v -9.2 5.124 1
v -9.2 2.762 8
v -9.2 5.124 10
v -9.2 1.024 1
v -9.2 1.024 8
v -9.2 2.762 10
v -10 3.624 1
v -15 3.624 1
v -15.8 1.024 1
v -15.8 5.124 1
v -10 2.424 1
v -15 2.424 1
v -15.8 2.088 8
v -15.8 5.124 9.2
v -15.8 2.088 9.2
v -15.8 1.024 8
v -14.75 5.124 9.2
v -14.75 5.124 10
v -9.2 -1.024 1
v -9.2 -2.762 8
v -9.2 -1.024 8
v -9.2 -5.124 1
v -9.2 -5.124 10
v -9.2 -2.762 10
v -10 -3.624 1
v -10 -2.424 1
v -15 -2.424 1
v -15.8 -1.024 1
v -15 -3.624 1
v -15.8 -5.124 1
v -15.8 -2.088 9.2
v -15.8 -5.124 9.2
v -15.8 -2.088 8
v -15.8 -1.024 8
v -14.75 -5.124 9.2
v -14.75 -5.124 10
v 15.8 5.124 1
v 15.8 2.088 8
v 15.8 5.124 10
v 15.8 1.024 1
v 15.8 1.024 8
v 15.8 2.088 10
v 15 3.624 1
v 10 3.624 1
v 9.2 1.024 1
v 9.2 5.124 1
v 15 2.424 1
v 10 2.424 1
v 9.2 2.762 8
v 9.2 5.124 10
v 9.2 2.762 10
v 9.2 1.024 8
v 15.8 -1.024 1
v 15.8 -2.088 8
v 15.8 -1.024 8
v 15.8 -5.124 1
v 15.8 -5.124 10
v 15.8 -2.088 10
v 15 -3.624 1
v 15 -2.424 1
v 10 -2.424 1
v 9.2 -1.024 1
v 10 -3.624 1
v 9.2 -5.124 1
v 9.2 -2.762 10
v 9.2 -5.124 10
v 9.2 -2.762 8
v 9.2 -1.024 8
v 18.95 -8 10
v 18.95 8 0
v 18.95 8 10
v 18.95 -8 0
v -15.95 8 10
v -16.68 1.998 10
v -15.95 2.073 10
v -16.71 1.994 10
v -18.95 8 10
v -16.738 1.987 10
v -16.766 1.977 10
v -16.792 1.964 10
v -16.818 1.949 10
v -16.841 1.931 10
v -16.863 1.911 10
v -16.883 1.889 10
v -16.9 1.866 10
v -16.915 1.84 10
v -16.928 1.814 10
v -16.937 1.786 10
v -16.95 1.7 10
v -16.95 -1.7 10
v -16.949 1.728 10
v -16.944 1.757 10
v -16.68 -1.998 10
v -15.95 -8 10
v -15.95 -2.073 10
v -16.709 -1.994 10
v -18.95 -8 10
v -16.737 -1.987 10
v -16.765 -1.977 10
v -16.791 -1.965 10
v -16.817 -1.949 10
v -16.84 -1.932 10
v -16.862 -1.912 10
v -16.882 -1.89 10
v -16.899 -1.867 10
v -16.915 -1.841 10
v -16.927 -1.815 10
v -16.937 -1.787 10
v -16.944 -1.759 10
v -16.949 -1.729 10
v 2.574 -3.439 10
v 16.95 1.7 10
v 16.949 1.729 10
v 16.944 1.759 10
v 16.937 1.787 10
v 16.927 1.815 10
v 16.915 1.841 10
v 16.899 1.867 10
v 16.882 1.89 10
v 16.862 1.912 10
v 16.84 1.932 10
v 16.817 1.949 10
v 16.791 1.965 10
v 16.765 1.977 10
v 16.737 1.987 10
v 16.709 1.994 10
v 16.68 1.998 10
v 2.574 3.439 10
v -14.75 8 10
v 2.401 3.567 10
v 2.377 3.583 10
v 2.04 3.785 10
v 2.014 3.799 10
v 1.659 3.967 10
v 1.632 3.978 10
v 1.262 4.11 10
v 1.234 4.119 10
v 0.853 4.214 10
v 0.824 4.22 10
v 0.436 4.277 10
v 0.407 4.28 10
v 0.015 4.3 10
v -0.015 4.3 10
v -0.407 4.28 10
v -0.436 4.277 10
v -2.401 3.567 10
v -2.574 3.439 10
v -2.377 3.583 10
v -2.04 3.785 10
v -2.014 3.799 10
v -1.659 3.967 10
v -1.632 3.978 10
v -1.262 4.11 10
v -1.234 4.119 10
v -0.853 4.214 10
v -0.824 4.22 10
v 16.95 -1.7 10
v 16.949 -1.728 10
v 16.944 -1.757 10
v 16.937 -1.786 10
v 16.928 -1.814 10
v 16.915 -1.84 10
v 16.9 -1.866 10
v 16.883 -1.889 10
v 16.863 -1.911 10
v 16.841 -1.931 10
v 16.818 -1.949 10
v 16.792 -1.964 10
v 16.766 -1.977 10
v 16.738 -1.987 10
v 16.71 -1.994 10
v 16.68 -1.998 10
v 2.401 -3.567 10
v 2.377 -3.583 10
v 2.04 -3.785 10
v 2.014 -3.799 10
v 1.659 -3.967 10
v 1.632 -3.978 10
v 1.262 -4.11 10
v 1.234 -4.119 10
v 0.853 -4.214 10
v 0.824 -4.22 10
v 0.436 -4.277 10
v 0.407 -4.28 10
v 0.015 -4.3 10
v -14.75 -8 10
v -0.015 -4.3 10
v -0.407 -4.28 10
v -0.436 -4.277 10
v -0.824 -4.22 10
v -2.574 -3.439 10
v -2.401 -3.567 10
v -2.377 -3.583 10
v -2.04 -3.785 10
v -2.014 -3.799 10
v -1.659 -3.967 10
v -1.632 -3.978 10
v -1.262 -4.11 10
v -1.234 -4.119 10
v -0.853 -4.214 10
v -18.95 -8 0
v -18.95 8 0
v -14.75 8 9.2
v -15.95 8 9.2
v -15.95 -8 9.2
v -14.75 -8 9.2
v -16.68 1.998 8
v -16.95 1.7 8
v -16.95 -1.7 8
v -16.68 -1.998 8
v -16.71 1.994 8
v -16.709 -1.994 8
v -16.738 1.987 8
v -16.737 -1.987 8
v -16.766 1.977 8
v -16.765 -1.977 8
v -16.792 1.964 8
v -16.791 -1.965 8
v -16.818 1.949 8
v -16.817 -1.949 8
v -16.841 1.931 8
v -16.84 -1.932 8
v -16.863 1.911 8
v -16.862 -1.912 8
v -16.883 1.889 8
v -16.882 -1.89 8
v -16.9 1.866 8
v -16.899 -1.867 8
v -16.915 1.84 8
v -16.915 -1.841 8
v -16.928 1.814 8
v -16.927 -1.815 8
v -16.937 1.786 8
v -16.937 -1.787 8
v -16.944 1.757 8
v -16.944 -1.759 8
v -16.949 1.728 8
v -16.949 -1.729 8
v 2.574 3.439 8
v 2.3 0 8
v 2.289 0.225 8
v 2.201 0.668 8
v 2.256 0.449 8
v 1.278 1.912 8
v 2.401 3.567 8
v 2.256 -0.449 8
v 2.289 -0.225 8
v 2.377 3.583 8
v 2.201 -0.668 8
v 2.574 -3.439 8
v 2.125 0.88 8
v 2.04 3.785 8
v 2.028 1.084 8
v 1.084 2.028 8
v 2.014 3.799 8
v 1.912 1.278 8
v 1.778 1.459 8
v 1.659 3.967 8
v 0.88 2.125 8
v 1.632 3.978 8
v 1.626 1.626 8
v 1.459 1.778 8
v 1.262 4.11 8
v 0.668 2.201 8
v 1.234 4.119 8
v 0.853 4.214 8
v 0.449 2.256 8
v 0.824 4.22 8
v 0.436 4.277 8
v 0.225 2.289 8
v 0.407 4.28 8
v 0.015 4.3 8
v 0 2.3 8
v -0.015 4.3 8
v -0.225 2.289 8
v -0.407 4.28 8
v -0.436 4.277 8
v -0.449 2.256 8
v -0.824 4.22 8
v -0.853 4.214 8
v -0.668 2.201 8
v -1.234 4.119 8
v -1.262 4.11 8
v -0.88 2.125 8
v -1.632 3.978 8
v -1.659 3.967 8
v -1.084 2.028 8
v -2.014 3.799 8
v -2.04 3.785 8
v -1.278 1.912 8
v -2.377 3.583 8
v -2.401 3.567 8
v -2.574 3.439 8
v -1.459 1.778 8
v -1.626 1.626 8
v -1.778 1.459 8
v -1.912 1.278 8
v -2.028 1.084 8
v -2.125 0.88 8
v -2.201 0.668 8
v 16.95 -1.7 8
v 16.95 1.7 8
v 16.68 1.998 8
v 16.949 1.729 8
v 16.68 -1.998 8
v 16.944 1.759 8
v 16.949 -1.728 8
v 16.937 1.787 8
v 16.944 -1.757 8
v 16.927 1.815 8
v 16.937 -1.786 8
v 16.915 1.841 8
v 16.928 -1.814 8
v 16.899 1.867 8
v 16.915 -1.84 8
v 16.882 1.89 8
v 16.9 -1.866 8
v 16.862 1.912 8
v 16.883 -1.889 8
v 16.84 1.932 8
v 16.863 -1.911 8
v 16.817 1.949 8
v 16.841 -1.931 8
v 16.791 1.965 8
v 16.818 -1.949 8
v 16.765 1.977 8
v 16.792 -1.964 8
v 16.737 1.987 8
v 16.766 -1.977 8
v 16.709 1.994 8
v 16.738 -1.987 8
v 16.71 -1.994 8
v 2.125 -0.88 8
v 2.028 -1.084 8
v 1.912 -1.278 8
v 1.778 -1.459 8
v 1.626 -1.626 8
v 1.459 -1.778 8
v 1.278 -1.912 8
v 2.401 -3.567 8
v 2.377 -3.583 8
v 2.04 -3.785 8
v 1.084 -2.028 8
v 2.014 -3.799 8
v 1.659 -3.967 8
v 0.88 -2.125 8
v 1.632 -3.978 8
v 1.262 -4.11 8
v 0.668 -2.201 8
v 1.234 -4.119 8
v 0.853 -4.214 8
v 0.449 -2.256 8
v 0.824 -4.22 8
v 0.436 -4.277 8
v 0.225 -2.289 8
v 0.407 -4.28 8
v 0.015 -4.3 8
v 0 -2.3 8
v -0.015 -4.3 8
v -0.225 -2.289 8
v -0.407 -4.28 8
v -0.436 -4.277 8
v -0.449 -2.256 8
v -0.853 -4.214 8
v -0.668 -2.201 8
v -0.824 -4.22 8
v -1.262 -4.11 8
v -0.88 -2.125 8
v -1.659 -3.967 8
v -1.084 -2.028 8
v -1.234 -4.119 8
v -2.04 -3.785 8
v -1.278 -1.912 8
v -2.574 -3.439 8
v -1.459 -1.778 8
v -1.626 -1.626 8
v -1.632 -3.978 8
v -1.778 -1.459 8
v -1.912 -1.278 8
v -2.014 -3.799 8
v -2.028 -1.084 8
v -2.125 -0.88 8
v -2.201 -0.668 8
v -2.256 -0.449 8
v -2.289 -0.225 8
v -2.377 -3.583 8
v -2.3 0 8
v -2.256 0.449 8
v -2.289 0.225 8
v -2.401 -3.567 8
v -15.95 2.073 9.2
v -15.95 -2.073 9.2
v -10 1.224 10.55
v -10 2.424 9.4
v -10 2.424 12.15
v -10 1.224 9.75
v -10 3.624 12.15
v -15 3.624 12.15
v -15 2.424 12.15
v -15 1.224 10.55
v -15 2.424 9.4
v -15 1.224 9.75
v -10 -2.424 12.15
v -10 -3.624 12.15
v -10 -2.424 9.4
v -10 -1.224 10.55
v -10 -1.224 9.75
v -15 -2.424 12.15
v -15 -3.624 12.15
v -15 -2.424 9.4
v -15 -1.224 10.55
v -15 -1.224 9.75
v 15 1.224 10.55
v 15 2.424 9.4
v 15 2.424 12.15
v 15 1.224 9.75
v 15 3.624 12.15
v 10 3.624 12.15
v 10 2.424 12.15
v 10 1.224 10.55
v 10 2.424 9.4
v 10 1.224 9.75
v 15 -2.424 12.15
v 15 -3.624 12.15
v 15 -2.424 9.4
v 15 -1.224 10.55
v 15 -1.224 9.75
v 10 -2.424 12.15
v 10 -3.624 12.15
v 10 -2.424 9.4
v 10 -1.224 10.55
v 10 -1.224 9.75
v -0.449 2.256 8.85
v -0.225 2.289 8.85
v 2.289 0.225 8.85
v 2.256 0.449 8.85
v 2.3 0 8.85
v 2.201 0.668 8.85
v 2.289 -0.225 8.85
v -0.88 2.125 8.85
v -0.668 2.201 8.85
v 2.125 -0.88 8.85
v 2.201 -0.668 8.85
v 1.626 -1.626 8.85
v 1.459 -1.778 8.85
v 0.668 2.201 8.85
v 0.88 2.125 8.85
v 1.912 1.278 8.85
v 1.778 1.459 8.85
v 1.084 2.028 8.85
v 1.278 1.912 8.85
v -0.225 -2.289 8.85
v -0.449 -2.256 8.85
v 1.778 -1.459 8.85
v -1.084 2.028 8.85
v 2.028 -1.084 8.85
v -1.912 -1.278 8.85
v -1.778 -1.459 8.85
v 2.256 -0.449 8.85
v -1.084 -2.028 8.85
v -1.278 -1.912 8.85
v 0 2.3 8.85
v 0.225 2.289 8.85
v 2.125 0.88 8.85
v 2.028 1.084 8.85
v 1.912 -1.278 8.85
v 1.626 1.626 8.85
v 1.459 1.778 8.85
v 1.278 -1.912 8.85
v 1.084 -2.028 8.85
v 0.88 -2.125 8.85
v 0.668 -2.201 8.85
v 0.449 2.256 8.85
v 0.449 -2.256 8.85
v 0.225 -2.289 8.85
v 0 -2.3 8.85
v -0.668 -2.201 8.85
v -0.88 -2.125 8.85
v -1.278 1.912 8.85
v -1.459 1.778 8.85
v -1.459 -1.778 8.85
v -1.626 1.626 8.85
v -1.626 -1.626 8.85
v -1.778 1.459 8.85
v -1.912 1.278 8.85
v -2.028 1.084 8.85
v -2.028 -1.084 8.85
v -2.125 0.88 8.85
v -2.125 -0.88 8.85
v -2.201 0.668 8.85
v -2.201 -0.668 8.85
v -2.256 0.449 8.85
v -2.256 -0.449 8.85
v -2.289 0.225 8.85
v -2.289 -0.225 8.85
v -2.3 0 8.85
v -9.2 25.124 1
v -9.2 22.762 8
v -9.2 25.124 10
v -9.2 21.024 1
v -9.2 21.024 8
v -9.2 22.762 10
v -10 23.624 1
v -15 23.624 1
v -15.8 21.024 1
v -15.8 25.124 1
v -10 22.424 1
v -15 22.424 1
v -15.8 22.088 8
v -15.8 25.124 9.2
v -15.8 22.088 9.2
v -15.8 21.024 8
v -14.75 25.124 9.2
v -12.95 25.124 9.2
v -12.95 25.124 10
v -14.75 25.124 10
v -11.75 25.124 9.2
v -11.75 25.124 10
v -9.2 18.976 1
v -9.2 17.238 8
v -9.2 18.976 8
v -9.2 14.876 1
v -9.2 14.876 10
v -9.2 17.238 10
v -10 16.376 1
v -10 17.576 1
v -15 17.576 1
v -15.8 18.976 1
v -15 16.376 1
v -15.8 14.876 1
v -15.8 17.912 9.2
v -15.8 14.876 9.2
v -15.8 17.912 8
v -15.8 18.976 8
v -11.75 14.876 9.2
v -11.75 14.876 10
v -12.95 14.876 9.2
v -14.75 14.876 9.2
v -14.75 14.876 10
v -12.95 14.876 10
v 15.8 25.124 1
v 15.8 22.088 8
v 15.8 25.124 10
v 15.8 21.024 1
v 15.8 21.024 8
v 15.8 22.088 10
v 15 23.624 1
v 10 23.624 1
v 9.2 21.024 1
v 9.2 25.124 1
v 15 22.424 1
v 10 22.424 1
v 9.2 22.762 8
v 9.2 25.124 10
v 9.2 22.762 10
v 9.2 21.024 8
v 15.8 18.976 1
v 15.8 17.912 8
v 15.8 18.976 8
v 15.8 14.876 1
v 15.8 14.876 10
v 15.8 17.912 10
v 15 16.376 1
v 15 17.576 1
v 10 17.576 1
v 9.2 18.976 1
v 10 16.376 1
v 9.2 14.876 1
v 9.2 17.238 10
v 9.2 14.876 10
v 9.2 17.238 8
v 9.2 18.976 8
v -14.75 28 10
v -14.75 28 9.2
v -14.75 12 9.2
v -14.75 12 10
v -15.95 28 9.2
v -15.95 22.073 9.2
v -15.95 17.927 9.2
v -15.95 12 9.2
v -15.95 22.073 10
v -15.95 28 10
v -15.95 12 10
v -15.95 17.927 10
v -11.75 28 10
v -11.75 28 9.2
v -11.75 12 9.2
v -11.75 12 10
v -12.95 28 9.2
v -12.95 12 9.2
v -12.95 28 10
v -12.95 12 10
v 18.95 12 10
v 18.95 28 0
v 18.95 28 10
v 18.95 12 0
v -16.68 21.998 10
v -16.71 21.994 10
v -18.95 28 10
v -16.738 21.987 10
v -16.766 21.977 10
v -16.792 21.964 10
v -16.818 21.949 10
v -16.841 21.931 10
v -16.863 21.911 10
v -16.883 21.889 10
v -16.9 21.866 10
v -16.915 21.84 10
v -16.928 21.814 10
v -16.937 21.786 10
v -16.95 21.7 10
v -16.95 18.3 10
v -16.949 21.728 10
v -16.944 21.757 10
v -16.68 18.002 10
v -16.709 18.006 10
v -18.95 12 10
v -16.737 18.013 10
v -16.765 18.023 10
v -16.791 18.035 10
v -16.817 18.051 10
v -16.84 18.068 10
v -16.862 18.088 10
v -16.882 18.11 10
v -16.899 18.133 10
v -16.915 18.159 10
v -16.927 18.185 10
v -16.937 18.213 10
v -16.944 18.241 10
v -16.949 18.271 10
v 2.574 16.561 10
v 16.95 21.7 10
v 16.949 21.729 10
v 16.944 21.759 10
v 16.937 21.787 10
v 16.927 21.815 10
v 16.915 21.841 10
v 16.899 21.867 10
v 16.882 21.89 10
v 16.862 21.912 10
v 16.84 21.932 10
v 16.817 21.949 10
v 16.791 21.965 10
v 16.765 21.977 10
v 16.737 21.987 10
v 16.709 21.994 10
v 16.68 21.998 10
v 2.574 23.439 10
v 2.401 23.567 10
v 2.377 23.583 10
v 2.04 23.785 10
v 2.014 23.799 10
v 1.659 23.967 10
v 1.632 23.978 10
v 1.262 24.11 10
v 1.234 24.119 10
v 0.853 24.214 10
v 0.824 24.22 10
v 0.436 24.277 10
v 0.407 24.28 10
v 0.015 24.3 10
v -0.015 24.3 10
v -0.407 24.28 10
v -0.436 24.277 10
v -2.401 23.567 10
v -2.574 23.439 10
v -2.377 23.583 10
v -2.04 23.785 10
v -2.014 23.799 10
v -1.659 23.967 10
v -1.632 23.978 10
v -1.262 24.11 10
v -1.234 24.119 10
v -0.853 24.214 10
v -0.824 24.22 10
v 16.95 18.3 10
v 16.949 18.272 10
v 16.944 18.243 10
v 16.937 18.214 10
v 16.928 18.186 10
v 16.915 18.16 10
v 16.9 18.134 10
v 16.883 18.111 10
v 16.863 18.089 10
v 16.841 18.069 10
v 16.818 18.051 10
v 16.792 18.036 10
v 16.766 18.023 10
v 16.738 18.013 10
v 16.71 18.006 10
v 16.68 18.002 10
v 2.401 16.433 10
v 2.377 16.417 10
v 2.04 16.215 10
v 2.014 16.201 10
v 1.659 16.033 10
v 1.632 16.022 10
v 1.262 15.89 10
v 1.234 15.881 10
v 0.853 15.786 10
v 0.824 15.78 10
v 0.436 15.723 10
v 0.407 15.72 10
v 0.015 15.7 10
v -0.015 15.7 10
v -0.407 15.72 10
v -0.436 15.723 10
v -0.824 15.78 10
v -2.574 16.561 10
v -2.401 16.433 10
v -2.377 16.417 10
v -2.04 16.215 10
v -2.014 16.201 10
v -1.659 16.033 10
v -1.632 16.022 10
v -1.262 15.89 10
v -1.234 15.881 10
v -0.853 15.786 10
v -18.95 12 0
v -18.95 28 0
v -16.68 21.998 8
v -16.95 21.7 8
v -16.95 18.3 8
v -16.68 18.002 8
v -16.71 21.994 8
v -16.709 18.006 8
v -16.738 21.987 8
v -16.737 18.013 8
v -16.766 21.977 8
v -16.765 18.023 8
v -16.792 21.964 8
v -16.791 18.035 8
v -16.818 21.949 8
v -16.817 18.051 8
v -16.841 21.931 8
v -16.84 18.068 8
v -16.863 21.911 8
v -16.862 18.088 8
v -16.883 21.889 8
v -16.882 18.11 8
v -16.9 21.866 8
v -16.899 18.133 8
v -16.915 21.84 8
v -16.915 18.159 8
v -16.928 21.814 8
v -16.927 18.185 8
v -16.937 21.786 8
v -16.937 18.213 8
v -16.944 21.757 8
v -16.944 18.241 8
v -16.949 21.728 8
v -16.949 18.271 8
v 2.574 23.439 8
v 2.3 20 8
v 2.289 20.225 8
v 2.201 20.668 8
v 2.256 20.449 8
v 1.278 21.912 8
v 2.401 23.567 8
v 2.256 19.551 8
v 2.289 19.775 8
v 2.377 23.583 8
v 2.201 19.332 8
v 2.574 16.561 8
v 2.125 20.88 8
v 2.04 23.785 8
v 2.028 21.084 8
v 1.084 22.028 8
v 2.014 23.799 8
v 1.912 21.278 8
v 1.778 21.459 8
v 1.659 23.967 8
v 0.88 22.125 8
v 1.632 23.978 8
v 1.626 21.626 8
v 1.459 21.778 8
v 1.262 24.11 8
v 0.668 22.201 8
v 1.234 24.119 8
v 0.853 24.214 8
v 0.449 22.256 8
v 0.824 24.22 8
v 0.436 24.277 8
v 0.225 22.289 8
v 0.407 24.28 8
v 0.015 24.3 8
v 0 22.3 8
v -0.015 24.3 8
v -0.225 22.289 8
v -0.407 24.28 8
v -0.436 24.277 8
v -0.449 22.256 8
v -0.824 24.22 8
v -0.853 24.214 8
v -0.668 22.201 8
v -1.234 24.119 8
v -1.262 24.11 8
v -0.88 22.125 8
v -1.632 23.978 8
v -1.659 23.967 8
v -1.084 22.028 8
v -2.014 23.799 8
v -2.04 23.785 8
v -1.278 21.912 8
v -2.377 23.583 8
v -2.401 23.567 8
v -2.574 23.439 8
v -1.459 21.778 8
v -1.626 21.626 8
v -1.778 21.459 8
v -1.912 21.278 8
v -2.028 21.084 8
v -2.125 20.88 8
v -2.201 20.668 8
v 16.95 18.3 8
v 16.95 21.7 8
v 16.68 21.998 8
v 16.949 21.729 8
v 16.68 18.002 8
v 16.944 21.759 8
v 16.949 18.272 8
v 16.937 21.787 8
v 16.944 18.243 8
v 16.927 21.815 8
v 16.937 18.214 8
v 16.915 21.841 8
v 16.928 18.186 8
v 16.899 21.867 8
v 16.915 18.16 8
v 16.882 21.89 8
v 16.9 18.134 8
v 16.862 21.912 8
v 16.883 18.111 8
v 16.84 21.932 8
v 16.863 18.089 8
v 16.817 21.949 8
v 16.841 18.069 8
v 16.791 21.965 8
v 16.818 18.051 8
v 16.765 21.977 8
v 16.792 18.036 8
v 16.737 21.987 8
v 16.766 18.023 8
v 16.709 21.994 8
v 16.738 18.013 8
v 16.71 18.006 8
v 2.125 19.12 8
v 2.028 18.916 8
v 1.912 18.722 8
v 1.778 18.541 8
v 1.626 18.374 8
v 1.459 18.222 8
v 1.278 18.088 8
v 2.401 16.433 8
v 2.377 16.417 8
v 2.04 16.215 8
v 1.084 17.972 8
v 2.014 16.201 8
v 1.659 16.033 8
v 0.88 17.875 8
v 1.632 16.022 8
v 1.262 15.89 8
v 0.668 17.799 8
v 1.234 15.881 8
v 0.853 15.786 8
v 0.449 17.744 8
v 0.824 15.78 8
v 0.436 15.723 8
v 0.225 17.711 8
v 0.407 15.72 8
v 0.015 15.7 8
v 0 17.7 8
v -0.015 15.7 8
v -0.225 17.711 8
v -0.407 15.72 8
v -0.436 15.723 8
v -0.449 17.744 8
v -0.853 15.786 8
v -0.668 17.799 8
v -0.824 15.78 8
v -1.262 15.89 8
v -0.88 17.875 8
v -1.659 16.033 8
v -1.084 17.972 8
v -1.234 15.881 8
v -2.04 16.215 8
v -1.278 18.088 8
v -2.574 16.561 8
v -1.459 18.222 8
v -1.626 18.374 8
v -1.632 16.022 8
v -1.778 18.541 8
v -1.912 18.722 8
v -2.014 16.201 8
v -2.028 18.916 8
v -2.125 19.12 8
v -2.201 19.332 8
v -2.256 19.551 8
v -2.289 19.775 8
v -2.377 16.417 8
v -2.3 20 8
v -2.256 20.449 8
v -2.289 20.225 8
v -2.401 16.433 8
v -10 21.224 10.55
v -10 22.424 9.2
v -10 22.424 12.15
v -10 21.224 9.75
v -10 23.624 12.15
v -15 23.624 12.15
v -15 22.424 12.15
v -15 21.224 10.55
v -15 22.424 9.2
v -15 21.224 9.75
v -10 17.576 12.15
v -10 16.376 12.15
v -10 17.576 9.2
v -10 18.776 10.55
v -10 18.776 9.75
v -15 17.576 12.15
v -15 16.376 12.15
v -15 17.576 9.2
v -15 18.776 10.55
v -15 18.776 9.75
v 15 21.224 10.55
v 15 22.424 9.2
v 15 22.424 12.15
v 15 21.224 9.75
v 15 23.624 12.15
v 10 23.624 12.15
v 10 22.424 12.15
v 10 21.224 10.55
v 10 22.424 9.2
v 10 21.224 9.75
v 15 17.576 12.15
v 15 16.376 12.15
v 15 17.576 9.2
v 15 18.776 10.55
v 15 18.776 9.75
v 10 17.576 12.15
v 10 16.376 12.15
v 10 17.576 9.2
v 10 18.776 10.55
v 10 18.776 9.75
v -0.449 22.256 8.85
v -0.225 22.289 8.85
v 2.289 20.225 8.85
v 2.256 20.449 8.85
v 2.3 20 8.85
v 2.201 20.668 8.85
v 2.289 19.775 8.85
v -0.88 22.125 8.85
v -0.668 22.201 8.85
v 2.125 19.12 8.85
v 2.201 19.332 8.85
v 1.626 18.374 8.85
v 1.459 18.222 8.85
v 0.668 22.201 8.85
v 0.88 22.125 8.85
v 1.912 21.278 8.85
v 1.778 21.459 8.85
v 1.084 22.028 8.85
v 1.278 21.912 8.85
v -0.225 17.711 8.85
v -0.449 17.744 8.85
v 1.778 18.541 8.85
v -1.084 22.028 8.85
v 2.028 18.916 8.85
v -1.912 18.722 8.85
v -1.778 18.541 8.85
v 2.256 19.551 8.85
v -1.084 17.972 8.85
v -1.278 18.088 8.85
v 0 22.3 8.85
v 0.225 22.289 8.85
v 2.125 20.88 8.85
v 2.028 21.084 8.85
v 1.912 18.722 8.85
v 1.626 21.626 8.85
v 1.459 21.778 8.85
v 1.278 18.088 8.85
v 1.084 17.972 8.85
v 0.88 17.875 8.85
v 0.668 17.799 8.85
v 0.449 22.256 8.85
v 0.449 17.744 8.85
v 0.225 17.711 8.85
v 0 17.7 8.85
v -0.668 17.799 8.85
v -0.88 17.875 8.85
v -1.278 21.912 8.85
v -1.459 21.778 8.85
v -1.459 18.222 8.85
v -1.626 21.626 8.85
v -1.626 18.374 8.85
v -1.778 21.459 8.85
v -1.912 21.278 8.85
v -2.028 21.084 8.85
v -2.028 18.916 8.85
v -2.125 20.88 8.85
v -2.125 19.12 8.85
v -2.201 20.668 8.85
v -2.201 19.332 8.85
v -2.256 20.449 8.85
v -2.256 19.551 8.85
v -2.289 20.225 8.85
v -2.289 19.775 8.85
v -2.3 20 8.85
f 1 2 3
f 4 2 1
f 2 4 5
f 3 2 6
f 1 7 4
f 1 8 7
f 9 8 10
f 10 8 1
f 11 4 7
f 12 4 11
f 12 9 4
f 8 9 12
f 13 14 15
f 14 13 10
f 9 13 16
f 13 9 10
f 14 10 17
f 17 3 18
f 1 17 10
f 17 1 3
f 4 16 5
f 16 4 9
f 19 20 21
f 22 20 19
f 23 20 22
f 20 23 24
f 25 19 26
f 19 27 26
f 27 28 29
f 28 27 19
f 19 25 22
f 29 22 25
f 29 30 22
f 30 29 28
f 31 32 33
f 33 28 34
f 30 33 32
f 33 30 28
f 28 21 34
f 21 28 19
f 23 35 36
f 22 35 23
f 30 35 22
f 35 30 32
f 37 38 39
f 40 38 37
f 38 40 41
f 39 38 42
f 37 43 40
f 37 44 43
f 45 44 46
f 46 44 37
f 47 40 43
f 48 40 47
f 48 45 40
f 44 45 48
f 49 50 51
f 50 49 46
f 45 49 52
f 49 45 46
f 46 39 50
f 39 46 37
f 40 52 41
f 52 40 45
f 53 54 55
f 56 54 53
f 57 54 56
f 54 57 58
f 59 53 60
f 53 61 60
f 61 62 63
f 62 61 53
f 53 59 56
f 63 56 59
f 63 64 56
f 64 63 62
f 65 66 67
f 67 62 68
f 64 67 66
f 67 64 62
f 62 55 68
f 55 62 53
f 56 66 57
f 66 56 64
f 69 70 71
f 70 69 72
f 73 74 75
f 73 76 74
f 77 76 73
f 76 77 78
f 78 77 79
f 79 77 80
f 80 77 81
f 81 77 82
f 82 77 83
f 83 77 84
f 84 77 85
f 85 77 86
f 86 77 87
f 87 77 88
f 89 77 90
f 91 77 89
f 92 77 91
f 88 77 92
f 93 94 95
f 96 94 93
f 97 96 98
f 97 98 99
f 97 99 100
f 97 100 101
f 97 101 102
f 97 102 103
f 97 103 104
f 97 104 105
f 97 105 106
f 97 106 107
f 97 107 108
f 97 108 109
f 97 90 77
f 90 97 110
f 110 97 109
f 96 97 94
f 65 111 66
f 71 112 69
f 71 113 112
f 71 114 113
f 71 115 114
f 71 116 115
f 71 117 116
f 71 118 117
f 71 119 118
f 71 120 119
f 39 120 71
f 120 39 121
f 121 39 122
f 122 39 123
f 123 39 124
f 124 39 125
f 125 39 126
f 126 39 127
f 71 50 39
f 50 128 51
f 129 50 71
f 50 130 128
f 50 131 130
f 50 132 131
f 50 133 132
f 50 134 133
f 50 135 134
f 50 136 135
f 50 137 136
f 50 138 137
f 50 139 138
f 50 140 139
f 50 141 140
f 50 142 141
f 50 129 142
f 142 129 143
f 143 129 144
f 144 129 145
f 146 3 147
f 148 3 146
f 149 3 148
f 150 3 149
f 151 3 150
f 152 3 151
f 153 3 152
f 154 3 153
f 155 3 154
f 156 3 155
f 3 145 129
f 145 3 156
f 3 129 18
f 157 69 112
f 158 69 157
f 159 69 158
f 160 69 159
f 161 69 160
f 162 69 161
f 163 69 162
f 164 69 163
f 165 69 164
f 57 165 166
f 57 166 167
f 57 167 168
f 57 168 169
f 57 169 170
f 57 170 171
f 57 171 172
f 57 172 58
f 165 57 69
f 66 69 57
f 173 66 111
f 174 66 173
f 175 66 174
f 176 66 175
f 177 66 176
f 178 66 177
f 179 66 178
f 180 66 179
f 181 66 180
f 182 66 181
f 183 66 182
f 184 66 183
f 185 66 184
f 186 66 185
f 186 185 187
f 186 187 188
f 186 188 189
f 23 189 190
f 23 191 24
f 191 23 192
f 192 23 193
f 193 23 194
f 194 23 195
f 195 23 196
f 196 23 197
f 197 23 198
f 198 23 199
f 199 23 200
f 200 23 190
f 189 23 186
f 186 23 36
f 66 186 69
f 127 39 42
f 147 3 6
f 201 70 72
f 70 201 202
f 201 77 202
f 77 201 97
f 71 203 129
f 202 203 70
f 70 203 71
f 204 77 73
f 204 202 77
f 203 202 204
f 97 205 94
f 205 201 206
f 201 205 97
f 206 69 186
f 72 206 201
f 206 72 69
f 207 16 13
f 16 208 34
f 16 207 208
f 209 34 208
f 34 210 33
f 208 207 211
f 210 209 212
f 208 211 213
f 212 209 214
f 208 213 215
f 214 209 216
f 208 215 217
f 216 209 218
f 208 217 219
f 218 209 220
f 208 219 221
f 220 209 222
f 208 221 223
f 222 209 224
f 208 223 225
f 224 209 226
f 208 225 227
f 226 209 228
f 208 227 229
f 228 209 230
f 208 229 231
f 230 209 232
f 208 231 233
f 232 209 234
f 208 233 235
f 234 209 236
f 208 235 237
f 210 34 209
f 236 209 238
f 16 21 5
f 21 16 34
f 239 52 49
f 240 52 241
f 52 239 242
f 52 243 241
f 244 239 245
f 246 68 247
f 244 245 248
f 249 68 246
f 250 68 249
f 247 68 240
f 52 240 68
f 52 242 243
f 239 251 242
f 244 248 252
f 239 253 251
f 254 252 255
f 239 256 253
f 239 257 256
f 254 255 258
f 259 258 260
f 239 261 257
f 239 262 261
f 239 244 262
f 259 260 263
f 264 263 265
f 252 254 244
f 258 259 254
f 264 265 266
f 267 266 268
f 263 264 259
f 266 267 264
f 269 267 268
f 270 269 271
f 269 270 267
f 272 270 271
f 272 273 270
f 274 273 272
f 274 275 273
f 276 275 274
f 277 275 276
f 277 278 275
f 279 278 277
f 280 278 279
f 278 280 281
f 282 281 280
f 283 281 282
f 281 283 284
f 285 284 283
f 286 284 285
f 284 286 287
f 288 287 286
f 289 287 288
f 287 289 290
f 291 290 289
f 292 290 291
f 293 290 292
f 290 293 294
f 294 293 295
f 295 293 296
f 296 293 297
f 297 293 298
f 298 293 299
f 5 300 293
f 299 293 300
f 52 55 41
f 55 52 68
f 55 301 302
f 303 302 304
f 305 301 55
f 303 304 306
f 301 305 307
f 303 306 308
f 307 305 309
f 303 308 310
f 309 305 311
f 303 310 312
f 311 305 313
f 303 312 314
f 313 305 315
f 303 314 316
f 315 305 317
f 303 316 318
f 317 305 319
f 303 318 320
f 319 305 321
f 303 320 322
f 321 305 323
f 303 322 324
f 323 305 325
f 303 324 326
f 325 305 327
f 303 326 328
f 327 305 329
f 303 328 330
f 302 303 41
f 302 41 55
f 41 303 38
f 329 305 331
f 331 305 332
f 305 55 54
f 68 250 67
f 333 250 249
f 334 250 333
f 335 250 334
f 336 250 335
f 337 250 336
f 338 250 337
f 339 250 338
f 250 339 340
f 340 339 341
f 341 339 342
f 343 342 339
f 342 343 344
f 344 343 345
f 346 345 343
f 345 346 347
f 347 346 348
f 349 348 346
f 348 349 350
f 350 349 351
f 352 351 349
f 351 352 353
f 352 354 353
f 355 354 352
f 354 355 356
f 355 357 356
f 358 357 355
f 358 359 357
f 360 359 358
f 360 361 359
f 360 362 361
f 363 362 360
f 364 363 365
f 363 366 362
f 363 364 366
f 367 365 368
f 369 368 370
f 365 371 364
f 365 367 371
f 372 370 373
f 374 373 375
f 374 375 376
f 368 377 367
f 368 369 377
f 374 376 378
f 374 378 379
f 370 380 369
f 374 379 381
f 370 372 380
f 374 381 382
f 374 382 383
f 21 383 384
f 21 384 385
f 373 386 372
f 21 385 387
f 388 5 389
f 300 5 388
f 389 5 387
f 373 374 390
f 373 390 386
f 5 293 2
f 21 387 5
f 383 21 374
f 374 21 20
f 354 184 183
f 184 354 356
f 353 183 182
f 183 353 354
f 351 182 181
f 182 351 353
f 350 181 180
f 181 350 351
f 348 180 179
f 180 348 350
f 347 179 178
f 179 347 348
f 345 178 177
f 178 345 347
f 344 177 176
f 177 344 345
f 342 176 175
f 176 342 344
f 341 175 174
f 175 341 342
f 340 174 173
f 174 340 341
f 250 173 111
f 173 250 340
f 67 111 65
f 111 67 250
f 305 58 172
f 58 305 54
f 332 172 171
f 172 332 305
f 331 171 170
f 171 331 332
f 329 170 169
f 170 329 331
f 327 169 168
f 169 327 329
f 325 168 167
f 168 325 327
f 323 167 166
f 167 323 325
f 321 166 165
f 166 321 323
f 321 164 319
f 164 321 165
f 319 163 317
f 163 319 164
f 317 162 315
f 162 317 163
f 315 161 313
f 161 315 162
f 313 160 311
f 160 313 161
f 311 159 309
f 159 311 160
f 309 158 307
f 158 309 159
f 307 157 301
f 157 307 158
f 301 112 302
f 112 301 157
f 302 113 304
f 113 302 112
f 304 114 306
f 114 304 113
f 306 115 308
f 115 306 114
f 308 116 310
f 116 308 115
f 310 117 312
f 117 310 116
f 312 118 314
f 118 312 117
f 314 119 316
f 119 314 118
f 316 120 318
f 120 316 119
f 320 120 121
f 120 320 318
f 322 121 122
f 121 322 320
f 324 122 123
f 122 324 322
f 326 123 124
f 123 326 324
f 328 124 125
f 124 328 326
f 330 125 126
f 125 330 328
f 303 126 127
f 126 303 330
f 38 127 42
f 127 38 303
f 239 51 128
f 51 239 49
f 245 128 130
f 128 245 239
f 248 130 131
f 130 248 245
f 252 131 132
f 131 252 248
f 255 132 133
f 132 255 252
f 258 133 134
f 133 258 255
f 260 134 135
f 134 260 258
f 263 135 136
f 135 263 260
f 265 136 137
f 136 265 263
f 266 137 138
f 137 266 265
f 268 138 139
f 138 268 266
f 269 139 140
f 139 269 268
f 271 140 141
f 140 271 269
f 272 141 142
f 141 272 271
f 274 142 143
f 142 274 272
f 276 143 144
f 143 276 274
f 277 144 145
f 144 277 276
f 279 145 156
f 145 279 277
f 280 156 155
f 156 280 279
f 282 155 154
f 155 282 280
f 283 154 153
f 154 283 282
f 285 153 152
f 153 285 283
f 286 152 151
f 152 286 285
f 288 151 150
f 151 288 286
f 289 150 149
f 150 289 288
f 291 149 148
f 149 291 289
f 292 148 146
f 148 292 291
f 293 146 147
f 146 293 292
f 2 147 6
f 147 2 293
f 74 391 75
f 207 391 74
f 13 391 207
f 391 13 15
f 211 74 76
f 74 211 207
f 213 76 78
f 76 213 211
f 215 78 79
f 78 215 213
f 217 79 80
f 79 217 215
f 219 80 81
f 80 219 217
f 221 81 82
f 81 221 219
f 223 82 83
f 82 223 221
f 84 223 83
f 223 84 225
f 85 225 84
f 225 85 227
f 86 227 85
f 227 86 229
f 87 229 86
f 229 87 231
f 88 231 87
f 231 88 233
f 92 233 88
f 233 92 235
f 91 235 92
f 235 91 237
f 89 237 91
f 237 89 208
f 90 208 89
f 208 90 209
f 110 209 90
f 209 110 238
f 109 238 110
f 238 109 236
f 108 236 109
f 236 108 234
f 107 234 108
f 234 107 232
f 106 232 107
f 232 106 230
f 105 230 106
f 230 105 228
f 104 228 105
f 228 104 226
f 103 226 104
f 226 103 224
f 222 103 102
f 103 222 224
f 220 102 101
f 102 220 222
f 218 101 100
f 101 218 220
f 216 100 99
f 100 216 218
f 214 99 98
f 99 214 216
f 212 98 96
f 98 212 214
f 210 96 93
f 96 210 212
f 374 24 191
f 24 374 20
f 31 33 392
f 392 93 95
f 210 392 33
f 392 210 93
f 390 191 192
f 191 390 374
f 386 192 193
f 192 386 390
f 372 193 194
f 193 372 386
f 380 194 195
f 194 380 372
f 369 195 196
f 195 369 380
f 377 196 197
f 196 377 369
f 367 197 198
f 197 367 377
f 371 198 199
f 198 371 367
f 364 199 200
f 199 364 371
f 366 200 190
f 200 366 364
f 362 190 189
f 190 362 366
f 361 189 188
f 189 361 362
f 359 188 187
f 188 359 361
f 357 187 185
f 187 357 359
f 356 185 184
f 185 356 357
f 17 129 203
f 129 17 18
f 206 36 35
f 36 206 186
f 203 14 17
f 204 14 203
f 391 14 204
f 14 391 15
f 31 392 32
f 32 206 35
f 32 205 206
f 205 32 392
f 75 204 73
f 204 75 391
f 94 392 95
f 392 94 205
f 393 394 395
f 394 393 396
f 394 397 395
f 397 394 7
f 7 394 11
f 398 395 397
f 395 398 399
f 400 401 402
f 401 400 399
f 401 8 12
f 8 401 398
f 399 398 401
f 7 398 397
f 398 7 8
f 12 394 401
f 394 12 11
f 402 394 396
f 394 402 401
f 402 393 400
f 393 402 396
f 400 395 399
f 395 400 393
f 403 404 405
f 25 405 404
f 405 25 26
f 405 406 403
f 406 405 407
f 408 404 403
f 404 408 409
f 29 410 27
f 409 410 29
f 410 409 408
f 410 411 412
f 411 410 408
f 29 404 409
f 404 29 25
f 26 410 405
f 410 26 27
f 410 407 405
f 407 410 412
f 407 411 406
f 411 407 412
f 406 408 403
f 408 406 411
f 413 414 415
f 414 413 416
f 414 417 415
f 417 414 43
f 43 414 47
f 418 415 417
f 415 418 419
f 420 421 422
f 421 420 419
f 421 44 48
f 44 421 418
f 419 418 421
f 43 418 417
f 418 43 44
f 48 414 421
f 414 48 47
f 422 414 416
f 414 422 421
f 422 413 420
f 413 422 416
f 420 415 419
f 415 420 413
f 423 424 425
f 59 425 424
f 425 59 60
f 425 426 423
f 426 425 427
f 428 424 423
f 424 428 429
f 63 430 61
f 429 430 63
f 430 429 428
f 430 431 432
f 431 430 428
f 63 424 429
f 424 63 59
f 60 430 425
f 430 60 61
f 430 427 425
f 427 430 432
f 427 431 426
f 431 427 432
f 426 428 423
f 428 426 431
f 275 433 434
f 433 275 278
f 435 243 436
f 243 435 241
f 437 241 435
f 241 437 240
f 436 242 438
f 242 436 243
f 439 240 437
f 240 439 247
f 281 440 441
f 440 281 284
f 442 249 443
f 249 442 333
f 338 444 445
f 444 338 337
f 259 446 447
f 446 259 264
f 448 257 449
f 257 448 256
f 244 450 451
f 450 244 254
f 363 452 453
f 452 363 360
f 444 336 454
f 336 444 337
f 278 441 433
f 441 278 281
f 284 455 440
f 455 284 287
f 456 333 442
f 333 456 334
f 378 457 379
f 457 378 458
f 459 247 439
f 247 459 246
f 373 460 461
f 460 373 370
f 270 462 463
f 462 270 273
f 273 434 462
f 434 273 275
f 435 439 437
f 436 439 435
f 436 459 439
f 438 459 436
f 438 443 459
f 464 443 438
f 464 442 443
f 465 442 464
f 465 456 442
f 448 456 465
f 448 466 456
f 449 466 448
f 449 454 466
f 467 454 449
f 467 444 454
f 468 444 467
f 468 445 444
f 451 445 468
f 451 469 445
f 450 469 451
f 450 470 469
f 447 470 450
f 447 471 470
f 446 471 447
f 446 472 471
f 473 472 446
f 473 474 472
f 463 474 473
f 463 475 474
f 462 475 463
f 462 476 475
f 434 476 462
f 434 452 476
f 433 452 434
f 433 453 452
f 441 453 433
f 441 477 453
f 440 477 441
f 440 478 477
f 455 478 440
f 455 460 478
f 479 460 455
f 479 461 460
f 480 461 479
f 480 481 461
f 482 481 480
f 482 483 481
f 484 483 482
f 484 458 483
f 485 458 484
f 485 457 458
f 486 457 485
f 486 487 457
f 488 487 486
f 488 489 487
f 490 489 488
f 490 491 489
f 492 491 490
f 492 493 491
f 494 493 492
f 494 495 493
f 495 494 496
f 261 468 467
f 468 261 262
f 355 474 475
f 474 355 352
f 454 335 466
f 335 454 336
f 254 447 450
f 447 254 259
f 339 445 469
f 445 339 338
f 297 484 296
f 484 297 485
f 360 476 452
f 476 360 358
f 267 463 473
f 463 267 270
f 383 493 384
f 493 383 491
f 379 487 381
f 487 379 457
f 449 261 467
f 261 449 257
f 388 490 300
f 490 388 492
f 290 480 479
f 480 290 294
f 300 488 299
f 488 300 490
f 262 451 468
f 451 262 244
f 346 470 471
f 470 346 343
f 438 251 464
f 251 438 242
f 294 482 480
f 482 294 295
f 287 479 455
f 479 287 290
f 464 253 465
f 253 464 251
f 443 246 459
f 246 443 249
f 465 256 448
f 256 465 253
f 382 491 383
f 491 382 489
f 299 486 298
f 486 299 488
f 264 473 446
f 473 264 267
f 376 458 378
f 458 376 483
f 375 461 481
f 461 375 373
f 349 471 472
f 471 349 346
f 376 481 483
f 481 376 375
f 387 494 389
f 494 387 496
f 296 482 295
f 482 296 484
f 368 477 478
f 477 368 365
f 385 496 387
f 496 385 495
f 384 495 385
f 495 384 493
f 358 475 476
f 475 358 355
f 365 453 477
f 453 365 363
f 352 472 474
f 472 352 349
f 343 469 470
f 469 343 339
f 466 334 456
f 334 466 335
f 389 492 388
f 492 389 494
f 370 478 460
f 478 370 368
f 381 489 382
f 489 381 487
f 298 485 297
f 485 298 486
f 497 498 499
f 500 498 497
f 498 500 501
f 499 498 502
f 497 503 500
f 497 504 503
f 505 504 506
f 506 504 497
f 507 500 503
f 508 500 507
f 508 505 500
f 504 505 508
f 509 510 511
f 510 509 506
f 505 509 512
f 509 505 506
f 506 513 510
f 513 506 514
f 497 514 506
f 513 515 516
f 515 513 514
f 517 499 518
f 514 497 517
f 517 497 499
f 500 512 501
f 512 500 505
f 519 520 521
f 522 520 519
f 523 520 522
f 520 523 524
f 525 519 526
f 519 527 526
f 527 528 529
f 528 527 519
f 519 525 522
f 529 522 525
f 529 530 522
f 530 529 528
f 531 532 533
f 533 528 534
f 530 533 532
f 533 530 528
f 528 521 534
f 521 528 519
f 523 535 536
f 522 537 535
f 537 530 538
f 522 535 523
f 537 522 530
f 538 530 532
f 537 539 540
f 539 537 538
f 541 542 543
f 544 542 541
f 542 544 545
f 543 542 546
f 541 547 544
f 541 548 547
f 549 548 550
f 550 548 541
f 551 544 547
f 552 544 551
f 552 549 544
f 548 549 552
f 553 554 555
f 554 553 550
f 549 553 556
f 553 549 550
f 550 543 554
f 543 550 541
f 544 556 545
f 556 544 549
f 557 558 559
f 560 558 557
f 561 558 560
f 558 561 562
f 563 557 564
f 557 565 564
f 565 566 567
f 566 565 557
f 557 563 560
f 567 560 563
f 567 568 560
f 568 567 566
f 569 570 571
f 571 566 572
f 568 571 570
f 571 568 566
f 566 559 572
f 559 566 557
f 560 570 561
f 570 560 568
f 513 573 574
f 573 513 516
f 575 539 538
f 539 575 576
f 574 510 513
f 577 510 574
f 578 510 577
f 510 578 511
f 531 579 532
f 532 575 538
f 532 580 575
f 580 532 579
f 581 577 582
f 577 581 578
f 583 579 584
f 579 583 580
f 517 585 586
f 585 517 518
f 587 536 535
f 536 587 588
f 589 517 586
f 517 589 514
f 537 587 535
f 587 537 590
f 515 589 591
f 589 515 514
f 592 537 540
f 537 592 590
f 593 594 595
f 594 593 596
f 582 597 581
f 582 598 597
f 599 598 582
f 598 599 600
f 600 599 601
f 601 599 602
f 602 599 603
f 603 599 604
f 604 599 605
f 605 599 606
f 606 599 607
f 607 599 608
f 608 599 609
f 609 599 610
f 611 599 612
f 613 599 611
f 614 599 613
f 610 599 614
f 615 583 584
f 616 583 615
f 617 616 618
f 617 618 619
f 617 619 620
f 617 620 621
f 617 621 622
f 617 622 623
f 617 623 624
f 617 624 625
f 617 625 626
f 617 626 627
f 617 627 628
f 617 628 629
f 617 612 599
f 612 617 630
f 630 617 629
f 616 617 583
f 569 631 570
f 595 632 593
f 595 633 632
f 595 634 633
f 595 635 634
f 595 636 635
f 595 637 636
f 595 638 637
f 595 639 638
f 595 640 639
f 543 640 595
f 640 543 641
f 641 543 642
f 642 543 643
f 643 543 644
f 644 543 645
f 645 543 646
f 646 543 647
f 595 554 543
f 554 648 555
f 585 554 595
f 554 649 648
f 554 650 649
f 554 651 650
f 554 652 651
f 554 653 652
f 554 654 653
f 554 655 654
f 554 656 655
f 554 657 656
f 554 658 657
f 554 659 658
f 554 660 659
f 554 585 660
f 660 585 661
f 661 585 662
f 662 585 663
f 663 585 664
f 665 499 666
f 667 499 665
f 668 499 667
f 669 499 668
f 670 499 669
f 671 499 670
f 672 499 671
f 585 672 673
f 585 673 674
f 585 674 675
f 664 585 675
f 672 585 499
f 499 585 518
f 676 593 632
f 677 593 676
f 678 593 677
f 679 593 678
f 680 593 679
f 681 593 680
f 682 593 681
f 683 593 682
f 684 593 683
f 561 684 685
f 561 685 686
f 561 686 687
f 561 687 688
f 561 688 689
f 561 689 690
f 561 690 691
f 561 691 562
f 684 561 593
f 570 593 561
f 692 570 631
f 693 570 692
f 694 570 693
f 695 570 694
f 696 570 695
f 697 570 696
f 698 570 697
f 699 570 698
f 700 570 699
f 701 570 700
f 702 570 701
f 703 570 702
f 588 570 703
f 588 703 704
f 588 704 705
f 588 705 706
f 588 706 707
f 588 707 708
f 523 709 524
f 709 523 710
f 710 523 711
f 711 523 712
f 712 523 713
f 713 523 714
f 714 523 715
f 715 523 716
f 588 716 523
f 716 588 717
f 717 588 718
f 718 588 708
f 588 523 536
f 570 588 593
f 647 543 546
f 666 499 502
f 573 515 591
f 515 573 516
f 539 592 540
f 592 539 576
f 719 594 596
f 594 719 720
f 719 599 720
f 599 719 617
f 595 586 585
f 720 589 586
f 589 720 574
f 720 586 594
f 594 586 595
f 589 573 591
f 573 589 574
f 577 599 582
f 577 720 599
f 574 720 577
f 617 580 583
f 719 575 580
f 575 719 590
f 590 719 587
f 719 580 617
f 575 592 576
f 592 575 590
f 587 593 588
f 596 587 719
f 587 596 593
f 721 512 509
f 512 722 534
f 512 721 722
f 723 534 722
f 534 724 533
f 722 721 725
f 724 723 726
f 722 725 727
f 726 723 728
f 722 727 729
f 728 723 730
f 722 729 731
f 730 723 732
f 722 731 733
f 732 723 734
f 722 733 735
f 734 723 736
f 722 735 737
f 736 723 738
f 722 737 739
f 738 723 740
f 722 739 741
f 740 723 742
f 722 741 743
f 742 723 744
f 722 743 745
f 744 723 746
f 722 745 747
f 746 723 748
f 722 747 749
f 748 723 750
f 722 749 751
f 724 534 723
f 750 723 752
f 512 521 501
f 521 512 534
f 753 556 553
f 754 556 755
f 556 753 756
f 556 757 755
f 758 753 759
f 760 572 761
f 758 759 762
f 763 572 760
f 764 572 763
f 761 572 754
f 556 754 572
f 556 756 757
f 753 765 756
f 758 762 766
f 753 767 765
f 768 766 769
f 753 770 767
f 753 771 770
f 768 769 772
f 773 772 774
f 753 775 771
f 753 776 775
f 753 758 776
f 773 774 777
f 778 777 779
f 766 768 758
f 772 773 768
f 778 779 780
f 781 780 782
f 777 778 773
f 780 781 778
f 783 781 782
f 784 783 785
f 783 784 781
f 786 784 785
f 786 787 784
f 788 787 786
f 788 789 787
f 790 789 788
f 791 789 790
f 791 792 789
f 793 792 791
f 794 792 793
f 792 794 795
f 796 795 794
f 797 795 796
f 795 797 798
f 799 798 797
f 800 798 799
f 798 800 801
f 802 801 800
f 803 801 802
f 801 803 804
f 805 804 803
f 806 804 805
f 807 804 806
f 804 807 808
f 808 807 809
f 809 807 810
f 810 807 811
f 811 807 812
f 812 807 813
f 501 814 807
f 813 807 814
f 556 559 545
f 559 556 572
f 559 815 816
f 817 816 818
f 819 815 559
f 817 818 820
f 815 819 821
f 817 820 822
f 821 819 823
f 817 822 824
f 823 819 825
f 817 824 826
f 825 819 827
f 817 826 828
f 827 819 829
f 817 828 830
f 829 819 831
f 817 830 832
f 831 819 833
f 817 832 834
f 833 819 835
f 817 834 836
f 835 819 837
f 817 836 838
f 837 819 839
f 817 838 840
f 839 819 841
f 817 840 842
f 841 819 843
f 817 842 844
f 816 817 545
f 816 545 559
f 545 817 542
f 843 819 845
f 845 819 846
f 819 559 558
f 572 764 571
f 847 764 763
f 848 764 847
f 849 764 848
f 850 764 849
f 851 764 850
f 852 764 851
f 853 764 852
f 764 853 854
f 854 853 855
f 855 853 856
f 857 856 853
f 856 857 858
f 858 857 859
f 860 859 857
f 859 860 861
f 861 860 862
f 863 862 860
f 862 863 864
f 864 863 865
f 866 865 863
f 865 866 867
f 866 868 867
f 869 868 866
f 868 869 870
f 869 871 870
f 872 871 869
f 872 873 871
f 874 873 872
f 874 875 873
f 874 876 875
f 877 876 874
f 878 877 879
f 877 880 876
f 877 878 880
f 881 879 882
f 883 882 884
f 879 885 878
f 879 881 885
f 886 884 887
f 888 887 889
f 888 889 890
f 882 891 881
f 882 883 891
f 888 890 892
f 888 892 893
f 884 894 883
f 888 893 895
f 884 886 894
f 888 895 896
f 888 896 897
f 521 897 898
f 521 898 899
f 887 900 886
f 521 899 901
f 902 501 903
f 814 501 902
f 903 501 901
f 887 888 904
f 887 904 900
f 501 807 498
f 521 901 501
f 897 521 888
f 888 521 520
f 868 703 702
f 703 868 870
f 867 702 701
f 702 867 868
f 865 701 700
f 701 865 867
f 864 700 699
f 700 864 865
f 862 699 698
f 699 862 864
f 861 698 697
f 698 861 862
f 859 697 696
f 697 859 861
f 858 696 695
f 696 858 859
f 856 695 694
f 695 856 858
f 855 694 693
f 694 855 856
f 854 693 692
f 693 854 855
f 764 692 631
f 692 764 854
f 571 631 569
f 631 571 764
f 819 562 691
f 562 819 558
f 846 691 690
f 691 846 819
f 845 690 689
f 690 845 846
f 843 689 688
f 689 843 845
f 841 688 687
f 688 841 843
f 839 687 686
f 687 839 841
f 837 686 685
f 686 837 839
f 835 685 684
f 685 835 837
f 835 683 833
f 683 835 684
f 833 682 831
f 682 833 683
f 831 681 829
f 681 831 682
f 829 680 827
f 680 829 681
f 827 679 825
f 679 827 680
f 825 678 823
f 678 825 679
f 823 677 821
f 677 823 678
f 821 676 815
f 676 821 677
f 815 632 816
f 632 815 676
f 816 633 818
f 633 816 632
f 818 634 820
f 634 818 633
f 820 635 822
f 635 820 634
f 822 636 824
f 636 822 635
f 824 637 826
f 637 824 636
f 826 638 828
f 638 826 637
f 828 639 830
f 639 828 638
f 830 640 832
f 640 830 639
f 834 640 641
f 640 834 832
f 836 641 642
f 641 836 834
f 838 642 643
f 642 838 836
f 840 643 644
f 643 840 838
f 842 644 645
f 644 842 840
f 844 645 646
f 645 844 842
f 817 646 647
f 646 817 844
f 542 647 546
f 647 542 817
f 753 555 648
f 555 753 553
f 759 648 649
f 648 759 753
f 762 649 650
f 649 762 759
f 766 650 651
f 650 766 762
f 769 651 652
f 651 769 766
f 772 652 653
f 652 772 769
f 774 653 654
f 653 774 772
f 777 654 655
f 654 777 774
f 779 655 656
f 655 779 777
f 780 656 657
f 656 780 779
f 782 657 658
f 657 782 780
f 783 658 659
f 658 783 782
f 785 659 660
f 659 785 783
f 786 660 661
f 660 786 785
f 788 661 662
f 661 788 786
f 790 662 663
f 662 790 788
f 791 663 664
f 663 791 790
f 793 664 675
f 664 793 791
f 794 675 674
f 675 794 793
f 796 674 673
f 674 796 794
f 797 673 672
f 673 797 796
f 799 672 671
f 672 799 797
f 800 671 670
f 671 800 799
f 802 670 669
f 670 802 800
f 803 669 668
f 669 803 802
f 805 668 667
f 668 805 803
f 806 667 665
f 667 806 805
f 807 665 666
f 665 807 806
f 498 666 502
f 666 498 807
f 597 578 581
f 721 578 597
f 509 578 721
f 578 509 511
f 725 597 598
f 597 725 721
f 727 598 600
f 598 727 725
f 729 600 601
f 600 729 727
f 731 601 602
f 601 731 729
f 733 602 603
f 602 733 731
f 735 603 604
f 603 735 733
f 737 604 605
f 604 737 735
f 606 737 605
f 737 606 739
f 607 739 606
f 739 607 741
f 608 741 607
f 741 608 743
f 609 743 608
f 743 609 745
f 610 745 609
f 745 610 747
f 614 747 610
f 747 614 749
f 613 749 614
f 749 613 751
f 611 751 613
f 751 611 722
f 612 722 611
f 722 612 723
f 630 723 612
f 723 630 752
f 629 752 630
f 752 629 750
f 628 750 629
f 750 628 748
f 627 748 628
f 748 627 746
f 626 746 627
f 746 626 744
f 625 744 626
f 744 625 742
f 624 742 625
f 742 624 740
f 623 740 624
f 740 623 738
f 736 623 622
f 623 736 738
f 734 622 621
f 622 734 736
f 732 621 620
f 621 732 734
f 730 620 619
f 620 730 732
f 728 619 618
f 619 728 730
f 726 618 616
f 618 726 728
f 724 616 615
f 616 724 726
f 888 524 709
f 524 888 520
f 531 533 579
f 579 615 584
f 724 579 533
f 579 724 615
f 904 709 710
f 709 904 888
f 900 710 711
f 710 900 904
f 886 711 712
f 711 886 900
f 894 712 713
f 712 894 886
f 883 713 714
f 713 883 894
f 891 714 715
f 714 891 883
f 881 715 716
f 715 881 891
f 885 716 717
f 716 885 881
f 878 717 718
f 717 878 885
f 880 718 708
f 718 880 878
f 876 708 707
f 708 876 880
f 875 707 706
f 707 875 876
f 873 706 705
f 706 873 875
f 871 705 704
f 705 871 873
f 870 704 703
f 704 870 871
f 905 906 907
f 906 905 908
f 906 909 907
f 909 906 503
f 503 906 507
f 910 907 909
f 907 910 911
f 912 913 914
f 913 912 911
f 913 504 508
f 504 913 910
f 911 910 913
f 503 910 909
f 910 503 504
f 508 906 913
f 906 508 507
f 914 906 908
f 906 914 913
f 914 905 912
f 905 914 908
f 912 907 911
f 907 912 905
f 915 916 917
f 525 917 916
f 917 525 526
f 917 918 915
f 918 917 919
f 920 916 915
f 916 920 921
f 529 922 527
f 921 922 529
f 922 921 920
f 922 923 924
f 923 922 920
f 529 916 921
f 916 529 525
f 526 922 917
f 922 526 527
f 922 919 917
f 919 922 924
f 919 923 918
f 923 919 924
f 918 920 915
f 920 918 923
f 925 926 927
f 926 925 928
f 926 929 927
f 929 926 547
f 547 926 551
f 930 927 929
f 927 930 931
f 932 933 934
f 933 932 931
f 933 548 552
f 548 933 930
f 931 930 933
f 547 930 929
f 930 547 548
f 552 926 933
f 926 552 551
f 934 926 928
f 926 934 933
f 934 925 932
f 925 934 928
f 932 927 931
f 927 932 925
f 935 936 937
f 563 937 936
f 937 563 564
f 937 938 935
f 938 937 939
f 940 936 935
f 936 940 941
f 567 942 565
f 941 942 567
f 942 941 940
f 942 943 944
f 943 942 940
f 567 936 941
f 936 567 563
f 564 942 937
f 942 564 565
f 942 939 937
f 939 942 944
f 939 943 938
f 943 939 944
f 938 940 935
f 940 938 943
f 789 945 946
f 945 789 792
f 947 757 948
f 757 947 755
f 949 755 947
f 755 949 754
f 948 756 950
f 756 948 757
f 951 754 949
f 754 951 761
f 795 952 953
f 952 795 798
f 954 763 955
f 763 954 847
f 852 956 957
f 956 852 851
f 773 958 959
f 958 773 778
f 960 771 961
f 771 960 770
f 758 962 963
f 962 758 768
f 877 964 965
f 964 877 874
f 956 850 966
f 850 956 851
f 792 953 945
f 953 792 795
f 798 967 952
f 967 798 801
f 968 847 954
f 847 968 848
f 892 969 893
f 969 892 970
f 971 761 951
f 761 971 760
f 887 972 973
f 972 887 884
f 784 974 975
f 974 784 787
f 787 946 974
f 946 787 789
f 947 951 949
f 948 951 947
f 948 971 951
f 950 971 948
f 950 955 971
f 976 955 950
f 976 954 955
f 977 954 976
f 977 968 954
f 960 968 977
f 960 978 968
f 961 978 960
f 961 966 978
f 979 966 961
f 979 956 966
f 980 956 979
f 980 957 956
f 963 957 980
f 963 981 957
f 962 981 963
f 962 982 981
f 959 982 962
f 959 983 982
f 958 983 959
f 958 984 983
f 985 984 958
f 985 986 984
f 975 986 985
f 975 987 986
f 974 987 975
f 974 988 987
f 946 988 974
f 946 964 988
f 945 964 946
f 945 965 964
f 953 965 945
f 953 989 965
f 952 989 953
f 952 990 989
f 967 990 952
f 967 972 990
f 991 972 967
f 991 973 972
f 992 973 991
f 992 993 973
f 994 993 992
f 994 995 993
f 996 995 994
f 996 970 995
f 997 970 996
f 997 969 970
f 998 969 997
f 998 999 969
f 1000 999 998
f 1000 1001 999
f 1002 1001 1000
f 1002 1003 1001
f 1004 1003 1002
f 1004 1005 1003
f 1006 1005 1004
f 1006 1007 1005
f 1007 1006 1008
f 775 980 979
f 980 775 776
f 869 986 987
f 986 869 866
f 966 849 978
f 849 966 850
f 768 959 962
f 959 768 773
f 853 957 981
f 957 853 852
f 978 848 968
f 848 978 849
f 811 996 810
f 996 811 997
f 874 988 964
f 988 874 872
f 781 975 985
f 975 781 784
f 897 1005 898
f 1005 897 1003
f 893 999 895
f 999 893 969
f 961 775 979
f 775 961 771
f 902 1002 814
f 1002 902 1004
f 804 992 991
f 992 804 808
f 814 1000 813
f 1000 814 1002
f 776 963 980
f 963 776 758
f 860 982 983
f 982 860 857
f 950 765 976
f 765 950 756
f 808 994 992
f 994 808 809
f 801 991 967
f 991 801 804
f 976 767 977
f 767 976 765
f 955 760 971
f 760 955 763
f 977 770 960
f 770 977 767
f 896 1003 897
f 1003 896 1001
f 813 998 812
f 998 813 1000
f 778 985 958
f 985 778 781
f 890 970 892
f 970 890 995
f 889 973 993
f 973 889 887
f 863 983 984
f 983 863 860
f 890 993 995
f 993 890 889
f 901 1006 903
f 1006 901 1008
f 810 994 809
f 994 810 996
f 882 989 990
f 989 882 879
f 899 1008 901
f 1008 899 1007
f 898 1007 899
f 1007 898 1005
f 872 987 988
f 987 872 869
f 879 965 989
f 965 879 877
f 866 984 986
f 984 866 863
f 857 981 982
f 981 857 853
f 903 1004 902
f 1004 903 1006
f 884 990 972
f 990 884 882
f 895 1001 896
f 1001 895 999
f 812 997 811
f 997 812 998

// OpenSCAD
// ホーン押さえスナップ爪のクーポン。
// 現行 socket のホーンバーポケット（テーパー一文字＋ハブ＋中心スタブ）を
// ミニブロック上面に複製し、バーを上から押さえる爪を付けた試験片。
// 上面の溝線 1 本 = 予圧 0.3、2 本 = 予圧 0.5。
// 印刷向きは本番同等（ポケット面を上・爪は縦）。
//
// 変遷:
// v1: バー端のナイフエッジ三角 → 返しの薄部がスライサーに消え噛まず
// v2: 垂直先端面 0.6 で噛むが上下ガタ
// v3: くさび予圧 0.15/0.30 → まだ緩い。原因はバーの「端」に爪を置いたことで、
//     端面は爪面から 0.3mm しか離れておらず、くさびの最も浅い区間にしか
//     エッジ接触しない（実効予圧が設計値の 1/3 程度＋印刷丸まりで目減り）
// v4: 爪をバーの「横」（先端付近の長辺側・計 4 本）へ移設。返し 1.2 をバーの
//     上面そのものに被せ、浅いくさび（勾配 ~0.3）でばね力を下向きの
//     押さえ付け力へ変換する。浮き方向には自己ロック気味に効く。

include <params.scad>

hs_preloads = [0.3, 0.5]; // くさび予圧（バー上面への食い込み設計値）
hs_hk       = 1.2;   // 返しの overhang（バー上面への被さり量）
hs_face     = 0.8;   // 返し先端の垂直面高さ（印刷消失防止。v3 の 0.6 から増量）
hs_tip_clear = 0.05; // 返し先端下面とバー上面のすき間
hs_claw_w   = 5;     // 爪の幅（バー長手方向）
hs_claw_t   = 1.2;   // 爪の梁厚
hs_root_z   = 1.0;   // 爪の根元高さ。ここから上が撓む
hs_block_h  = 10;    // ブロック高。ポケット床 = hs_block_h - (horn_thick + horn_clearance)
hs_bw       = 16;    // ブロック奥行き（爪の逃がし分 v3 より広め）
hs_lead     = 1.6;   // 返しの上の差し込みガイド高
hs_side     = 0.8;   // 爪の左右（X 方向）の逃がし
hs_claw_x   = 12.5;  // 爪の中心 |x|（バー先端寄り。バー幅が細く上面が広く出る位置）

pocket_d = horn_thick + horn_clearance;  // ポケット深さ 2.0
floor_z  = hs_block_h - pocket_d;        // ポケット床
lx       = 2 * (horn_arm_l + horn_clearance) + 4;  // ブロック全長（端に薄壁を残す）

// 現行 socket と同一のポケット 2D 形状（テーパー一文字バー＋ハブ円）
module horn_pocket_2d() {
  offset(r = horn_clearance)
    union() {
      polygon([
        [-horn_arm_l, -horn_arm_w_tip/2],
        [          0, -horn_arm_w_base/2],
        [ horn_arm_l, -horn_arm_w_tip/2],
        [ horn_arm_l,  horn_arm_w_tip/2],
        [          0,  horn_arm_w_base/2],
        [-horn_arm_l,  horn_arm_w_tip/2]
      ]);
      circle(d = horn_hub_d);
    }
}

// バー長手 x でのポケット半幅（バー部分のみ・クリアランス込み）
function bar_hw(x) = horn_clearance +
  (horn_arm_w_tip + (horn_arm_w_base - horn_arm_w_tip) * (1 - abs(x) / horn_arm_l)) / 2;

// +Y 側・中心 cx の押さえ爪。梁は Y 方向に撓み、返しはバー上面に被さる。
// くさび下面: 爪面側（バーの外）が低く、先端（バーの上）が高い浅い坂。
// バー上面(floor_z + horn_thick)に対し、被さり区間で preload ぶん食い込む設計。
module claw(cx, preload) {
  cy = bar_hw(cx);                          // 爪の内面 y = ポケット縁
  bar_top = floor_z + horn_thick;
  hz_lo = bar_top - preload;                // くさびの爪面側の高さ（バー上面より低い）
  wedge = preload + hs_tip_clear;           // 坂の総上がり（先端はバー上面を僅かに越える）
  translate([cx, cy, 0]) {
    // 梁（内面 y=0 ローカル、+Y へ厚み）
    translate([-hs_claw_w/2, 0, hs_root_z])
      cube([hs_claw_w, hs_claw_t, hz_lo + wedge + hs_face + hs_lead - hs_root_z]);
    // 返し（Y-Z 断面の多角形を X へ押し出し）
    translate([-hs_claw_w/2, 0, 0])
      rotate([90, 0, 90])
        linear_extrude(height = hs_claw_w)
          polygon([
            [    0, hz_lo],                          // 爪面・坂の下端
            [-hs_hk, hz_lo + wedge],                 // 先端・坂の上端（バー上面+0.05）
            [-hs_hk, hz_lo + wedge + hs_face],       // 先端の垂直面
            [    0, hz_lo + wedge + hs_face + hs_lead], // 差し込みガイド
          ]);
  }
}

module snap_block(preload, notches) {
  difference() {
    translate([-lx/2, -hs_bw/2, 0])
      cube([lx, hs_bw, hs_block_h]);
    // ポケット（上面から掘る）
    translate([0, 0, floor_z])
      linear_extrude(height = pocket_d + 0.1)
        horn_pocket_2d();
    // 爪の切り離し: 内側（返しの通り道）・左右・背面（撓みしろ 1.5）を逃がす
    for (sx = [-1, 1], sy = [0, 1])
      mirror([0, sy, 0])
        translate([sx * hs_claw_x - hs_claw_w/2 - hs_side,
                   bar_hw(hs_claw_x) - hs_hk - 0.2, hs_root_z])
          cube([hs_claw_w + 2*hs_side, hs_hk + 0.2 + hs_claw_t + 1.5, hs_block_h]);
    // 変種判別の溝線（上面左端寄り。1 本=予圧0.3 / 2 本=0.5）
    for (t = [0 : notches - 1])
      translate([-lx/2 + 3 + t * 3, -hs_bw/2 - 0.1, hs_block_h - 0.8])
        cube([1.2, hs_bw + 0.2, 0.9]);
  }
  // 爪（両先端付近の両脇・計 4 本）
  for (sx = [-1, 1], sy = [0, 1])
    mirror([0, sy, 0])
      claw(sx * hs_claw_x, preload);
  // 中心スタブ（本番同様: ホーン中心くぼみへ嵌合、床から horn_thick/2 突出）
  translate([0, 0, floor_z - 0.1])
    cylinder(d = horn_stub_d, h = horn_thick/2 + 0.1);
}

for (i = [0 : len(hs_preloads) - 1])
  translate([0, i * (hs_bw + 4), 0])
    snap_block(hs_preloads[i], i + 1);
